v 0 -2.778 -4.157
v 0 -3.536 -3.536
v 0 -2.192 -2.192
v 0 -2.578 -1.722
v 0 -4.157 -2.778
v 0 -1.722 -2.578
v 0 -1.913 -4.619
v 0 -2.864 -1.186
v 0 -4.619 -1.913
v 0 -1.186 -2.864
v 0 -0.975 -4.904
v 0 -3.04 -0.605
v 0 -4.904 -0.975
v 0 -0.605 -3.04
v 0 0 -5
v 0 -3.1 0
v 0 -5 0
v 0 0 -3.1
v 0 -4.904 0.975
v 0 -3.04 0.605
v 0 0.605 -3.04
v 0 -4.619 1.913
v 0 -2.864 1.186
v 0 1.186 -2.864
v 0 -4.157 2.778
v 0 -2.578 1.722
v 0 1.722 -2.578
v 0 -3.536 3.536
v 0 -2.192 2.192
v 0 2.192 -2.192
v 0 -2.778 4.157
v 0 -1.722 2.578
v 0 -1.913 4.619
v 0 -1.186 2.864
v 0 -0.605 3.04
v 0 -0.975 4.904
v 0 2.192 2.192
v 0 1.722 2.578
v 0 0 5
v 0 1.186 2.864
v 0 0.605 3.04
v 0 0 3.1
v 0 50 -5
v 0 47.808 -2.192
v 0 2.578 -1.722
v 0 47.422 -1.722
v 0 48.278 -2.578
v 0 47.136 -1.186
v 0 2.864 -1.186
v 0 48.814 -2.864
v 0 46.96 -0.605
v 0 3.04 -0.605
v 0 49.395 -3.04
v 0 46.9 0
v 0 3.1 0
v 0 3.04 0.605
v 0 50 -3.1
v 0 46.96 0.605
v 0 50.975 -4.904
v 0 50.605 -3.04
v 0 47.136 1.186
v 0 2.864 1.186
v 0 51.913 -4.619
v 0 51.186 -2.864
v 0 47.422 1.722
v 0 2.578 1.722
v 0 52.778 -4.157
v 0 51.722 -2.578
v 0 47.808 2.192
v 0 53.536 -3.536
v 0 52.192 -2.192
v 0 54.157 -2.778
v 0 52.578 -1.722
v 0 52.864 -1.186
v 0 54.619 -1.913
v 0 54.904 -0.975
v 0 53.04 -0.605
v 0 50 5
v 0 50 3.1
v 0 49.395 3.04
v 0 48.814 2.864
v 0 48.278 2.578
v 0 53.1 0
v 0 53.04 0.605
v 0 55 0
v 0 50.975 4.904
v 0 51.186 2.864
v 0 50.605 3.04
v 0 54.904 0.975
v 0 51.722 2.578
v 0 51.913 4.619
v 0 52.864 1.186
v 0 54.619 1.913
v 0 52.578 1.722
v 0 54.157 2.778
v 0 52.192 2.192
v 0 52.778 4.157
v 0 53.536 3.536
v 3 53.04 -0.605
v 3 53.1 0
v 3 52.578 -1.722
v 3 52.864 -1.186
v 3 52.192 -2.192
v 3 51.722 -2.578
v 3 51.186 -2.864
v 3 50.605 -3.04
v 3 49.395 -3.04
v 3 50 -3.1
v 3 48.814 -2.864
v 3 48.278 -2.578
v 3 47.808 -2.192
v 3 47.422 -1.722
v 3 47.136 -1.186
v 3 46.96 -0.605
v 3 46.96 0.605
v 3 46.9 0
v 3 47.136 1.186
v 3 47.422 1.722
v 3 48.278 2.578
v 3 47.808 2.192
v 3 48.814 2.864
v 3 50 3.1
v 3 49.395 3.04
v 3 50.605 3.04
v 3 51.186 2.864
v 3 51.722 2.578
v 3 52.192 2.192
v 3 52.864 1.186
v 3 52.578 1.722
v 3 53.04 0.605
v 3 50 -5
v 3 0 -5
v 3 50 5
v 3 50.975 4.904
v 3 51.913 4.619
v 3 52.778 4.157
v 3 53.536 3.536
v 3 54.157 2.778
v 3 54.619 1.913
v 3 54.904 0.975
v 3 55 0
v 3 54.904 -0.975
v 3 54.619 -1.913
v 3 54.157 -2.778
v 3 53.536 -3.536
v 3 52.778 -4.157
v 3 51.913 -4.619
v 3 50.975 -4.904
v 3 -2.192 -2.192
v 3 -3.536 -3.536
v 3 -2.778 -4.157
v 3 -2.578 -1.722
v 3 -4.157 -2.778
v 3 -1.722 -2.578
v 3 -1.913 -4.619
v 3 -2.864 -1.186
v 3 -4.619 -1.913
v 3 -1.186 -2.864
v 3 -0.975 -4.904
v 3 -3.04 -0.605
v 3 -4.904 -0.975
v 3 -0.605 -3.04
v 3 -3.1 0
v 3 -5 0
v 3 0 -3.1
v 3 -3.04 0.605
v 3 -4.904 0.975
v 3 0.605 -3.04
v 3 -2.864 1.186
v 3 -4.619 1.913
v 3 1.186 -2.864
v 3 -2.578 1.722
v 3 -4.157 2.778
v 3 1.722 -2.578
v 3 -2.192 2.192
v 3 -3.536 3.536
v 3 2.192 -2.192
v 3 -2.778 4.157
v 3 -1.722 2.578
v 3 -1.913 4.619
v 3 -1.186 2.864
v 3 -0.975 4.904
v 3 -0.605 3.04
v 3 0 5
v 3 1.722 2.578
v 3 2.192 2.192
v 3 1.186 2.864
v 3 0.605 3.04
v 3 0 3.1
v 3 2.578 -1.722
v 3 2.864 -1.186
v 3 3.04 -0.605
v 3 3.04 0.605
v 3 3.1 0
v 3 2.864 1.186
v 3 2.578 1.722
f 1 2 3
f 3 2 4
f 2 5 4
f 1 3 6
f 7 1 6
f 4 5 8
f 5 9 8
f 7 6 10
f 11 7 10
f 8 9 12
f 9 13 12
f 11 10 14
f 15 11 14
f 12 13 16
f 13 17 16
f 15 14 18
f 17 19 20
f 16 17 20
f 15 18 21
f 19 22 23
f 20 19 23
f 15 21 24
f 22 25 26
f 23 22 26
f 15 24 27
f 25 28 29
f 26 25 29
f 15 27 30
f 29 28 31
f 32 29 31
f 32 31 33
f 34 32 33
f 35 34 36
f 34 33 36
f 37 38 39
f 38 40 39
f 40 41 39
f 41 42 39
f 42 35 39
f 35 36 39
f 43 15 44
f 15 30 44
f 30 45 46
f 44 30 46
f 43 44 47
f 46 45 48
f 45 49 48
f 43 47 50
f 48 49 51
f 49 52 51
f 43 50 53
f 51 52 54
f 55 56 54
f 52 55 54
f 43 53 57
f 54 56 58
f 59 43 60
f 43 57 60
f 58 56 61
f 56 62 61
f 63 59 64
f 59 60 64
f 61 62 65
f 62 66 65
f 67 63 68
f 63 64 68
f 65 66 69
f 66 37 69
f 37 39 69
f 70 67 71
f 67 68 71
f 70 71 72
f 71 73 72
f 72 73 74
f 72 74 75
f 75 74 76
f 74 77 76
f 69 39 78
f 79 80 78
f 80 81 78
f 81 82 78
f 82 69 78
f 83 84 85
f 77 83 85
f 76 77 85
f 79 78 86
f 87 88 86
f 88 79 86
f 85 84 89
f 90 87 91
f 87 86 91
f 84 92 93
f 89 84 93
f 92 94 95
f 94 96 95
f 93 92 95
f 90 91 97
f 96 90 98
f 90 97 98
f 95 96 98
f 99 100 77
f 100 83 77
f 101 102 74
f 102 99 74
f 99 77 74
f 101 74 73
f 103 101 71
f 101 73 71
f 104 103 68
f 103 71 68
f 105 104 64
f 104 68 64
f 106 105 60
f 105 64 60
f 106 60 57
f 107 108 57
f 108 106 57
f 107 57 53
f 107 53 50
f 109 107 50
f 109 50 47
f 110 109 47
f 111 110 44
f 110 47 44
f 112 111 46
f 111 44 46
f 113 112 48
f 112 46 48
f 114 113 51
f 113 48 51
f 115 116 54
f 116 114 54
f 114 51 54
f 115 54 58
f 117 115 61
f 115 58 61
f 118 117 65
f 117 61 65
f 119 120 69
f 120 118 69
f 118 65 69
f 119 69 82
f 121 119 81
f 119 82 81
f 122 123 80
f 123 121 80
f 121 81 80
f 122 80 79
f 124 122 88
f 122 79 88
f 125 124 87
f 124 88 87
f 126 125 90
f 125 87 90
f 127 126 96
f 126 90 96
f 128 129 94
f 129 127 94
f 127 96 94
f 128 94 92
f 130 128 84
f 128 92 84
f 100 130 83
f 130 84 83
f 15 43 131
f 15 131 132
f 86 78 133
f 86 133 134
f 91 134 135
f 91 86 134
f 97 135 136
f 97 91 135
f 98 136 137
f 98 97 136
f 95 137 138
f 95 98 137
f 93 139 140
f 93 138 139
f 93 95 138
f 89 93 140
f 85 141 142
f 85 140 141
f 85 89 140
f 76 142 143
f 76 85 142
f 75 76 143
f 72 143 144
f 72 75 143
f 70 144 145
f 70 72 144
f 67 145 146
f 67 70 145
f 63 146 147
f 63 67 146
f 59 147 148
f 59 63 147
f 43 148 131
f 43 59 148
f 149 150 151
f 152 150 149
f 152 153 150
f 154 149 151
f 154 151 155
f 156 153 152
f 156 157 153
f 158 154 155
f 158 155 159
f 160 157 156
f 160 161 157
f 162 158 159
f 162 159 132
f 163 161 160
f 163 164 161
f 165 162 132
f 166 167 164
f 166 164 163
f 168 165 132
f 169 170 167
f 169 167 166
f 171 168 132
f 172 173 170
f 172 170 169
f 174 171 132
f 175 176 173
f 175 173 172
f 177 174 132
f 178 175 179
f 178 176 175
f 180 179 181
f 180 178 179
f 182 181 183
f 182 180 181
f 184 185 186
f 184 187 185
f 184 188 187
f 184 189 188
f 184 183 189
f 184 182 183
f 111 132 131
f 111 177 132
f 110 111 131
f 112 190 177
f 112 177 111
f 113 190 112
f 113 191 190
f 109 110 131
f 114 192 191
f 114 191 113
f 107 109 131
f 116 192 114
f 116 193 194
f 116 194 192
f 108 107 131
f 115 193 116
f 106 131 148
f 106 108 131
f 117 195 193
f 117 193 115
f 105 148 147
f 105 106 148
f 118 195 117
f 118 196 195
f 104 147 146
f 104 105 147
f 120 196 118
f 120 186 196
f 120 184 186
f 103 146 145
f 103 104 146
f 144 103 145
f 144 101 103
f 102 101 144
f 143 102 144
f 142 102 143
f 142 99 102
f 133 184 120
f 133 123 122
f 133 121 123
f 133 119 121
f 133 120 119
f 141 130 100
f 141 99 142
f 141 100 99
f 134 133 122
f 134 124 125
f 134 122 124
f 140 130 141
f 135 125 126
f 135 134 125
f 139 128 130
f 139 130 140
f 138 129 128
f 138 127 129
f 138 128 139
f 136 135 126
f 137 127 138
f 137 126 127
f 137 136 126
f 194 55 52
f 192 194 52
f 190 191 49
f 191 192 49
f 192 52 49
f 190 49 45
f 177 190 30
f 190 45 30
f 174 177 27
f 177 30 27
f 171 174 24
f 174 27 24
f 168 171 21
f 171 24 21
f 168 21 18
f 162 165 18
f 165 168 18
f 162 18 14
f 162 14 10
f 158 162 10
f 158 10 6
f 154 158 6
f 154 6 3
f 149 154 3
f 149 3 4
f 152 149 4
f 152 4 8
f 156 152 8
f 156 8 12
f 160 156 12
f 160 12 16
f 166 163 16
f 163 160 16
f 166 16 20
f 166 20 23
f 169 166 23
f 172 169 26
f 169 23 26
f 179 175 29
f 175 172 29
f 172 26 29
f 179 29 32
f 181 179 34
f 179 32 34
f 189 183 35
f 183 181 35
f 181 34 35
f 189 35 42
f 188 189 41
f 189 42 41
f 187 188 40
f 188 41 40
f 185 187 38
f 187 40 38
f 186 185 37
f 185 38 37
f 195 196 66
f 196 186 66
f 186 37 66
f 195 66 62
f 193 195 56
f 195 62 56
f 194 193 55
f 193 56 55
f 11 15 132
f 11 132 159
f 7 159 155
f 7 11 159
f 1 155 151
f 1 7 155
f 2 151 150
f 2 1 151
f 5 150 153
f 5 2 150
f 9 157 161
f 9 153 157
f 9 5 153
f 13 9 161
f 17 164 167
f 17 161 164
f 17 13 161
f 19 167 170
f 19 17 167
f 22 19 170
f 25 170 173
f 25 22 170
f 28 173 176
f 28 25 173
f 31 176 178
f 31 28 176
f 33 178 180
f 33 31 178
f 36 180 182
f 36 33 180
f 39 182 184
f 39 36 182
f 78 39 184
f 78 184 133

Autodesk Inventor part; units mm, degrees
ref_plane "YZ Plane" through (0, 0, 0) normal (1, 0, 0) x (0, 1, 0)
ref_plane "XZ Plane" through (0, 0, 0) normal (0, 1, 0) x (-1, 0, 0)
ref_plane "XY Plane" through (0, 0, 0) normal (0, 0, 1) x (1, 0, 0)
sketch "Sketch1" plane through (0, 0, 0) normal (1, 0, 0) x (0, 1, 0)
  circle A0 centre (0, 0) radius 3.1
  arc A1 (0, 5) -> (0, -5) centre (0, 0) ccw
  line L0 (0, 5) -> (50, 5)
  line L1 (50, -5) -> (0, -5)
  arc A2 (50, -5) -> (50, 5) centre (50, 0) ccw
  circle A3 centre (50, 0) radius 3.1
  dimension "d0" = 6.2
  dimension "d1" = 10
  dimension "d3" = 50
  dimension "d5" = 6.2
  dimension "d26" = 5
extrude "Extrusion1" add sketch "Sketch1" along normal blind 3
ref_plane "Work Plane1" through (-2, 0, 0) normal (1, 0, 0) x (0, 0, -1)
sketch "Sketch5" plane through (3, 0, 0) normal (1, 0, 0) x (0, 0, -1)
  line L0 (-5, 50) -> (-5, 0) projected
  arc A0 (-5, 0) -> (5, 0) centre (0, 0) ccw projected
  circle A1 centre (0, 50) radius 3.1 projected
  circle A2 centre (0, 0) radius 3.1 projected
  arc A3 (-5, 0) -> (5, 0) centre (0, 0) ccw projected
  line L1 (5, 0) -> (5, 50) projected
  arc A4 (5, 50) -> (-5, 50) centre (0, 50) ccw projected
  line L2 (-5, 50) -> (-5, 0) projected
  line L3 (0, -5) -> (0, 6)
  line L4 (0, 6) -> (5, 11)
  line L5 (5, 0) -> (5, 50) projected
  line L6 (0, 6) -> (-5, 11)
  line L7 (0, 55) -> (0, 44)
  line L8 (0, 44) -> (-5, 39)
  line L9 (0, 44) -> (5, 39)
  line L10 (0, 44) -> (7.0711, 44) construction
  dimension "d27" = 11
  dimension "d28" = 135
  dimension "d29" = 11
  dimension "d30" = 135
  dimension "d31" = 45
equation "\"d5\" = d0"
equation "\"d26\" = 0.5 * d1"
equation "\"d29\" = d27"
equation "\"d30\" = d28"
properties part number "ArmSpan"
